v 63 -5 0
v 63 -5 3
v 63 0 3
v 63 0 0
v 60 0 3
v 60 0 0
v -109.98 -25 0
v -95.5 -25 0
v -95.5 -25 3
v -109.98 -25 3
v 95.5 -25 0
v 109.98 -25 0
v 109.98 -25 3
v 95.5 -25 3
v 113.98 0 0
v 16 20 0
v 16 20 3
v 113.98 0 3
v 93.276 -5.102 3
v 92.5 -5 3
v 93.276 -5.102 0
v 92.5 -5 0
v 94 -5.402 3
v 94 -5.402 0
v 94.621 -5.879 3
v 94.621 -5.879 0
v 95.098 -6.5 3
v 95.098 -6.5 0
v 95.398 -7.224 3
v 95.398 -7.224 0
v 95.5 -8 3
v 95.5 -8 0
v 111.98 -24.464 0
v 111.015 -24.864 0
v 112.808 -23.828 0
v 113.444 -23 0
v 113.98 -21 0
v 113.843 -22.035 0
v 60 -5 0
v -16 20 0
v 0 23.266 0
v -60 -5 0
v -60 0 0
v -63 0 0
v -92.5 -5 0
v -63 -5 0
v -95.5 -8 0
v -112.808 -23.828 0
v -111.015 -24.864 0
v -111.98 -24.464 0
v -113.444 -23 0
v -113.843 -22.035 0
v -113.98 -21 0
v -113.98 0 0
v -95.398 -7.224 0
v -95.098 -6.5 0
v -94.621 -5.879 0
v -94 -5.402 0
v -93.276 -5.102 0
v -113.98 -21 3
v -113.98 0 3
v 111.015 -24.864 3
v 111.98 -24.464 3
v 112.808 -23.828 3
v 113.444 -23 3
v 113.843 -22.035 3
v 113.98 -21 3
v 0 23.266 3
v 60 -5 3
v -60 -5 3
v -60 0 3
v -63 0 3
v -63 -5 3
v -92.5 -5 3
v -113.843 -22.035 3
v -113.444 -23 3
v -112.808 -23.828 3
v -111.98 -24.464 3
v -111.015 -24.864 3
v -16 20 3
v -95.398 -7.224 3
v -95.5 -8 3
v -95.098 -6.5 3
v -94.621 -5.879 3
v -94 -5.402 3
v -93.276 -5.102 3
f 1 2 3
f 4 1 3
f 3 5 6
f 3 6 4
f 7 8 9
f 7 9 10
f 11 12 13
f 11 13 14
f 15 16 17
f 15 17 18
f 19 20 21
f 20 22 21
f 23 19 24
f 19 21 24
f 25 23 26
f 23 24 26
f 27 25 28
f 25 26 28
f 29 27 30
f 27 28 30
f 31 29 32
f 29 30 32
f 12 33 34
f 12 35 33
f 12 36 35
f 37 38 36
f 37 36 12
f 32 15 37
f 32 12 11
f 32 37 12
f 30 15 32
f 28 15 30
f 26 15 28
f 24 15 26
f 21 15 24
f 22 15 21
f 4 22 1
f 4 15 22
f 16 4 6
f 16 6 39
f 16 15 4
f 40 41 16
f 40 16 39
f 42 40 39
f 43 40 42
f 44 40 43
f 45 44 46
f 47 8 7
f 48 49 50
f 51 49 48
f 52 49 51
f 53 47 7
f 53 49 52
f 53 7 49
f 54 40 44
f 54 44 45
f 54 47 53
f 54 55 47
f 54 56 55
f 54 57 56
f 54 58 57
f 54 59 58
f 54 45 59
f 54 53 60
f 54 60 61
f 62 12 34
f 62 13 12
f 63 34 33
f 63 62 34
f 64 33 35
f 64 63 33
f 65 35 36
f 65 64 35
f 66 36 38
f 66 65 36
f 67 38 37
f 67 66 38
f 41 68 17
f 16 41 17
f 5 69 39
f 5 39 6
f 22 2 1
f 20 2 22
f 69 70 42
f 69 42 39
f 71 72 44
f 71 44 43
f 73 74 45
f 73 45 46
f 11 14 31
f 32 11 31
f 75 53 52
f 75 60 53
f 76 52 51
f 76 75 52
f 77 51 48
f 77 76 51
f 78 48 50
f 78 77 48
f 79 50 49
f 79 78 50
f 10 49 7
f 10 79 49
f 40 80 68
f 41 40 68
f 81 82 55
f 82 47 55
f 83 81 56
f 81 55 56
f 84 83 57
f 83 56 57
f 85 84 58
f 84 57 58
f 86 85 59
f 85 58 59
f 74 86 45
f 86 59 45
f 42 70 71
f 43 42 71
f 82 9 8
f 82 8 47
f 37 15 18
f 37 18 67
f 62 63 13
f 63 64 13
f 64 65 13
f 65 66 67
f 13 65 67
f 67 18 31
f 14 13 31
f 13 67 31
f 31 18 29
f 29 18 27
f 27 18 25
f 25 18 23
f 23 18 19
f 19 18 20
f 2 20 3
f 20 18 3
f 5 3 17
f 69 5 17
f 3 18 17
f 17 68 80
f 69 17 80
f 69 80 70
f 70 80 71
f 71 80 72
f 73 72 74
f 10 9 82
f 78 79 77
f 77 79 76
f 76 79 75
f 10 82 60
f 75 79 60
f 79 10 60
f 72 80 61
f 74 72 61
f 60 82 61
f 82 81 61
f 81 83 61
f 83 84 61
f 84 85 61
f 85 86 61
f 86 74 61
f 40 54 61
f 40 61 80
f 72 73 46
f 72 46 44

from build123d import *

# Parameters (mm, degrees)
BOSS_EXTRUDE1_DEPTH = 3
SKETCH2_W           = 191
SKETCH2_H           = 40
CUT_EXTRUDE1_DEPTH  = 4
FILLET1_R           = 3
SKETCH3_W           = 3
SKETCH3_H           = 10
CUT_EXTRUDE2_DEPTH  = 4
FILLET2_R           = 4
BOSS_EXTRUDE2_DEPTH = 3


with BuildPart() as part:
    # Sketch1 → Boss-Extrude1 (new body)
    with BuildSketch(Plane.XY):
        Polygon((-16, 19.999811529), (16, 19.999811529), (113.979628183, 0), (113.979628183, -25), (-113.979628183, -25), (-113.979628183, 0), align=None)
    extrude(amount=BOSS_EXTRUDE1_DEPTH)

    # Sketch2 → Cut-Extrude1 (cut, through all)
    with BuildSketch(Plane.XY.offset(3)):
        with Locations((0, -25)):
            Rectangle(SKETCH2_W, SKETCH2_H)
    extrude(amount=-CUT_EXTRUDE1_DEPTH, mode=Mode.SUBTRACT)

    # Fillet1
    fillet1_edges = [part.edges().sort_by_distance(p)[0] for p in [
        (95.5, -5, 1.5),
        (-95.5, -5, 1.5),
    ]]
    fillet(fillet1_edges, radius=FILLET1_R)

    # Sketch3 → Cut-Extrude2 (cut, through all)
    with BuildSketch(Plane.XY.offset(3)):
        with Locations((-61.5, -5)):
            Rectangle(SKETCH3_W, SKETCH3_H)
        with Locations((61.5, -5)):
            Rectangle(SKETCH3_W, SKETCH3_H)
    extrude(amount=-CUT_EXTRUDE2_DEPTH, mode=Mode.SUBTRACT)

    # Fillet2
    fillet2_edges = [part.edges().sort_by_distance(p)[0] for p in [
        (113.979628183, -25, 1.5),
        (-113.979628183, -25, 1.5),
    ]]
    fillet(fillet2_edges, radius=FILLET2_R)

    # Sketch4 → Boss-Extrude2 (add)
    with BuildSketch(Plane.XY.offset(3)):
        Polygon((-26.29440044, 17.898496465), (0, 23.265765793), (26.811324143, 17.792980892), align=None)
    extrude(amount=-BOSS_EXTRUDE2_DEPTH)


solid = part.part
